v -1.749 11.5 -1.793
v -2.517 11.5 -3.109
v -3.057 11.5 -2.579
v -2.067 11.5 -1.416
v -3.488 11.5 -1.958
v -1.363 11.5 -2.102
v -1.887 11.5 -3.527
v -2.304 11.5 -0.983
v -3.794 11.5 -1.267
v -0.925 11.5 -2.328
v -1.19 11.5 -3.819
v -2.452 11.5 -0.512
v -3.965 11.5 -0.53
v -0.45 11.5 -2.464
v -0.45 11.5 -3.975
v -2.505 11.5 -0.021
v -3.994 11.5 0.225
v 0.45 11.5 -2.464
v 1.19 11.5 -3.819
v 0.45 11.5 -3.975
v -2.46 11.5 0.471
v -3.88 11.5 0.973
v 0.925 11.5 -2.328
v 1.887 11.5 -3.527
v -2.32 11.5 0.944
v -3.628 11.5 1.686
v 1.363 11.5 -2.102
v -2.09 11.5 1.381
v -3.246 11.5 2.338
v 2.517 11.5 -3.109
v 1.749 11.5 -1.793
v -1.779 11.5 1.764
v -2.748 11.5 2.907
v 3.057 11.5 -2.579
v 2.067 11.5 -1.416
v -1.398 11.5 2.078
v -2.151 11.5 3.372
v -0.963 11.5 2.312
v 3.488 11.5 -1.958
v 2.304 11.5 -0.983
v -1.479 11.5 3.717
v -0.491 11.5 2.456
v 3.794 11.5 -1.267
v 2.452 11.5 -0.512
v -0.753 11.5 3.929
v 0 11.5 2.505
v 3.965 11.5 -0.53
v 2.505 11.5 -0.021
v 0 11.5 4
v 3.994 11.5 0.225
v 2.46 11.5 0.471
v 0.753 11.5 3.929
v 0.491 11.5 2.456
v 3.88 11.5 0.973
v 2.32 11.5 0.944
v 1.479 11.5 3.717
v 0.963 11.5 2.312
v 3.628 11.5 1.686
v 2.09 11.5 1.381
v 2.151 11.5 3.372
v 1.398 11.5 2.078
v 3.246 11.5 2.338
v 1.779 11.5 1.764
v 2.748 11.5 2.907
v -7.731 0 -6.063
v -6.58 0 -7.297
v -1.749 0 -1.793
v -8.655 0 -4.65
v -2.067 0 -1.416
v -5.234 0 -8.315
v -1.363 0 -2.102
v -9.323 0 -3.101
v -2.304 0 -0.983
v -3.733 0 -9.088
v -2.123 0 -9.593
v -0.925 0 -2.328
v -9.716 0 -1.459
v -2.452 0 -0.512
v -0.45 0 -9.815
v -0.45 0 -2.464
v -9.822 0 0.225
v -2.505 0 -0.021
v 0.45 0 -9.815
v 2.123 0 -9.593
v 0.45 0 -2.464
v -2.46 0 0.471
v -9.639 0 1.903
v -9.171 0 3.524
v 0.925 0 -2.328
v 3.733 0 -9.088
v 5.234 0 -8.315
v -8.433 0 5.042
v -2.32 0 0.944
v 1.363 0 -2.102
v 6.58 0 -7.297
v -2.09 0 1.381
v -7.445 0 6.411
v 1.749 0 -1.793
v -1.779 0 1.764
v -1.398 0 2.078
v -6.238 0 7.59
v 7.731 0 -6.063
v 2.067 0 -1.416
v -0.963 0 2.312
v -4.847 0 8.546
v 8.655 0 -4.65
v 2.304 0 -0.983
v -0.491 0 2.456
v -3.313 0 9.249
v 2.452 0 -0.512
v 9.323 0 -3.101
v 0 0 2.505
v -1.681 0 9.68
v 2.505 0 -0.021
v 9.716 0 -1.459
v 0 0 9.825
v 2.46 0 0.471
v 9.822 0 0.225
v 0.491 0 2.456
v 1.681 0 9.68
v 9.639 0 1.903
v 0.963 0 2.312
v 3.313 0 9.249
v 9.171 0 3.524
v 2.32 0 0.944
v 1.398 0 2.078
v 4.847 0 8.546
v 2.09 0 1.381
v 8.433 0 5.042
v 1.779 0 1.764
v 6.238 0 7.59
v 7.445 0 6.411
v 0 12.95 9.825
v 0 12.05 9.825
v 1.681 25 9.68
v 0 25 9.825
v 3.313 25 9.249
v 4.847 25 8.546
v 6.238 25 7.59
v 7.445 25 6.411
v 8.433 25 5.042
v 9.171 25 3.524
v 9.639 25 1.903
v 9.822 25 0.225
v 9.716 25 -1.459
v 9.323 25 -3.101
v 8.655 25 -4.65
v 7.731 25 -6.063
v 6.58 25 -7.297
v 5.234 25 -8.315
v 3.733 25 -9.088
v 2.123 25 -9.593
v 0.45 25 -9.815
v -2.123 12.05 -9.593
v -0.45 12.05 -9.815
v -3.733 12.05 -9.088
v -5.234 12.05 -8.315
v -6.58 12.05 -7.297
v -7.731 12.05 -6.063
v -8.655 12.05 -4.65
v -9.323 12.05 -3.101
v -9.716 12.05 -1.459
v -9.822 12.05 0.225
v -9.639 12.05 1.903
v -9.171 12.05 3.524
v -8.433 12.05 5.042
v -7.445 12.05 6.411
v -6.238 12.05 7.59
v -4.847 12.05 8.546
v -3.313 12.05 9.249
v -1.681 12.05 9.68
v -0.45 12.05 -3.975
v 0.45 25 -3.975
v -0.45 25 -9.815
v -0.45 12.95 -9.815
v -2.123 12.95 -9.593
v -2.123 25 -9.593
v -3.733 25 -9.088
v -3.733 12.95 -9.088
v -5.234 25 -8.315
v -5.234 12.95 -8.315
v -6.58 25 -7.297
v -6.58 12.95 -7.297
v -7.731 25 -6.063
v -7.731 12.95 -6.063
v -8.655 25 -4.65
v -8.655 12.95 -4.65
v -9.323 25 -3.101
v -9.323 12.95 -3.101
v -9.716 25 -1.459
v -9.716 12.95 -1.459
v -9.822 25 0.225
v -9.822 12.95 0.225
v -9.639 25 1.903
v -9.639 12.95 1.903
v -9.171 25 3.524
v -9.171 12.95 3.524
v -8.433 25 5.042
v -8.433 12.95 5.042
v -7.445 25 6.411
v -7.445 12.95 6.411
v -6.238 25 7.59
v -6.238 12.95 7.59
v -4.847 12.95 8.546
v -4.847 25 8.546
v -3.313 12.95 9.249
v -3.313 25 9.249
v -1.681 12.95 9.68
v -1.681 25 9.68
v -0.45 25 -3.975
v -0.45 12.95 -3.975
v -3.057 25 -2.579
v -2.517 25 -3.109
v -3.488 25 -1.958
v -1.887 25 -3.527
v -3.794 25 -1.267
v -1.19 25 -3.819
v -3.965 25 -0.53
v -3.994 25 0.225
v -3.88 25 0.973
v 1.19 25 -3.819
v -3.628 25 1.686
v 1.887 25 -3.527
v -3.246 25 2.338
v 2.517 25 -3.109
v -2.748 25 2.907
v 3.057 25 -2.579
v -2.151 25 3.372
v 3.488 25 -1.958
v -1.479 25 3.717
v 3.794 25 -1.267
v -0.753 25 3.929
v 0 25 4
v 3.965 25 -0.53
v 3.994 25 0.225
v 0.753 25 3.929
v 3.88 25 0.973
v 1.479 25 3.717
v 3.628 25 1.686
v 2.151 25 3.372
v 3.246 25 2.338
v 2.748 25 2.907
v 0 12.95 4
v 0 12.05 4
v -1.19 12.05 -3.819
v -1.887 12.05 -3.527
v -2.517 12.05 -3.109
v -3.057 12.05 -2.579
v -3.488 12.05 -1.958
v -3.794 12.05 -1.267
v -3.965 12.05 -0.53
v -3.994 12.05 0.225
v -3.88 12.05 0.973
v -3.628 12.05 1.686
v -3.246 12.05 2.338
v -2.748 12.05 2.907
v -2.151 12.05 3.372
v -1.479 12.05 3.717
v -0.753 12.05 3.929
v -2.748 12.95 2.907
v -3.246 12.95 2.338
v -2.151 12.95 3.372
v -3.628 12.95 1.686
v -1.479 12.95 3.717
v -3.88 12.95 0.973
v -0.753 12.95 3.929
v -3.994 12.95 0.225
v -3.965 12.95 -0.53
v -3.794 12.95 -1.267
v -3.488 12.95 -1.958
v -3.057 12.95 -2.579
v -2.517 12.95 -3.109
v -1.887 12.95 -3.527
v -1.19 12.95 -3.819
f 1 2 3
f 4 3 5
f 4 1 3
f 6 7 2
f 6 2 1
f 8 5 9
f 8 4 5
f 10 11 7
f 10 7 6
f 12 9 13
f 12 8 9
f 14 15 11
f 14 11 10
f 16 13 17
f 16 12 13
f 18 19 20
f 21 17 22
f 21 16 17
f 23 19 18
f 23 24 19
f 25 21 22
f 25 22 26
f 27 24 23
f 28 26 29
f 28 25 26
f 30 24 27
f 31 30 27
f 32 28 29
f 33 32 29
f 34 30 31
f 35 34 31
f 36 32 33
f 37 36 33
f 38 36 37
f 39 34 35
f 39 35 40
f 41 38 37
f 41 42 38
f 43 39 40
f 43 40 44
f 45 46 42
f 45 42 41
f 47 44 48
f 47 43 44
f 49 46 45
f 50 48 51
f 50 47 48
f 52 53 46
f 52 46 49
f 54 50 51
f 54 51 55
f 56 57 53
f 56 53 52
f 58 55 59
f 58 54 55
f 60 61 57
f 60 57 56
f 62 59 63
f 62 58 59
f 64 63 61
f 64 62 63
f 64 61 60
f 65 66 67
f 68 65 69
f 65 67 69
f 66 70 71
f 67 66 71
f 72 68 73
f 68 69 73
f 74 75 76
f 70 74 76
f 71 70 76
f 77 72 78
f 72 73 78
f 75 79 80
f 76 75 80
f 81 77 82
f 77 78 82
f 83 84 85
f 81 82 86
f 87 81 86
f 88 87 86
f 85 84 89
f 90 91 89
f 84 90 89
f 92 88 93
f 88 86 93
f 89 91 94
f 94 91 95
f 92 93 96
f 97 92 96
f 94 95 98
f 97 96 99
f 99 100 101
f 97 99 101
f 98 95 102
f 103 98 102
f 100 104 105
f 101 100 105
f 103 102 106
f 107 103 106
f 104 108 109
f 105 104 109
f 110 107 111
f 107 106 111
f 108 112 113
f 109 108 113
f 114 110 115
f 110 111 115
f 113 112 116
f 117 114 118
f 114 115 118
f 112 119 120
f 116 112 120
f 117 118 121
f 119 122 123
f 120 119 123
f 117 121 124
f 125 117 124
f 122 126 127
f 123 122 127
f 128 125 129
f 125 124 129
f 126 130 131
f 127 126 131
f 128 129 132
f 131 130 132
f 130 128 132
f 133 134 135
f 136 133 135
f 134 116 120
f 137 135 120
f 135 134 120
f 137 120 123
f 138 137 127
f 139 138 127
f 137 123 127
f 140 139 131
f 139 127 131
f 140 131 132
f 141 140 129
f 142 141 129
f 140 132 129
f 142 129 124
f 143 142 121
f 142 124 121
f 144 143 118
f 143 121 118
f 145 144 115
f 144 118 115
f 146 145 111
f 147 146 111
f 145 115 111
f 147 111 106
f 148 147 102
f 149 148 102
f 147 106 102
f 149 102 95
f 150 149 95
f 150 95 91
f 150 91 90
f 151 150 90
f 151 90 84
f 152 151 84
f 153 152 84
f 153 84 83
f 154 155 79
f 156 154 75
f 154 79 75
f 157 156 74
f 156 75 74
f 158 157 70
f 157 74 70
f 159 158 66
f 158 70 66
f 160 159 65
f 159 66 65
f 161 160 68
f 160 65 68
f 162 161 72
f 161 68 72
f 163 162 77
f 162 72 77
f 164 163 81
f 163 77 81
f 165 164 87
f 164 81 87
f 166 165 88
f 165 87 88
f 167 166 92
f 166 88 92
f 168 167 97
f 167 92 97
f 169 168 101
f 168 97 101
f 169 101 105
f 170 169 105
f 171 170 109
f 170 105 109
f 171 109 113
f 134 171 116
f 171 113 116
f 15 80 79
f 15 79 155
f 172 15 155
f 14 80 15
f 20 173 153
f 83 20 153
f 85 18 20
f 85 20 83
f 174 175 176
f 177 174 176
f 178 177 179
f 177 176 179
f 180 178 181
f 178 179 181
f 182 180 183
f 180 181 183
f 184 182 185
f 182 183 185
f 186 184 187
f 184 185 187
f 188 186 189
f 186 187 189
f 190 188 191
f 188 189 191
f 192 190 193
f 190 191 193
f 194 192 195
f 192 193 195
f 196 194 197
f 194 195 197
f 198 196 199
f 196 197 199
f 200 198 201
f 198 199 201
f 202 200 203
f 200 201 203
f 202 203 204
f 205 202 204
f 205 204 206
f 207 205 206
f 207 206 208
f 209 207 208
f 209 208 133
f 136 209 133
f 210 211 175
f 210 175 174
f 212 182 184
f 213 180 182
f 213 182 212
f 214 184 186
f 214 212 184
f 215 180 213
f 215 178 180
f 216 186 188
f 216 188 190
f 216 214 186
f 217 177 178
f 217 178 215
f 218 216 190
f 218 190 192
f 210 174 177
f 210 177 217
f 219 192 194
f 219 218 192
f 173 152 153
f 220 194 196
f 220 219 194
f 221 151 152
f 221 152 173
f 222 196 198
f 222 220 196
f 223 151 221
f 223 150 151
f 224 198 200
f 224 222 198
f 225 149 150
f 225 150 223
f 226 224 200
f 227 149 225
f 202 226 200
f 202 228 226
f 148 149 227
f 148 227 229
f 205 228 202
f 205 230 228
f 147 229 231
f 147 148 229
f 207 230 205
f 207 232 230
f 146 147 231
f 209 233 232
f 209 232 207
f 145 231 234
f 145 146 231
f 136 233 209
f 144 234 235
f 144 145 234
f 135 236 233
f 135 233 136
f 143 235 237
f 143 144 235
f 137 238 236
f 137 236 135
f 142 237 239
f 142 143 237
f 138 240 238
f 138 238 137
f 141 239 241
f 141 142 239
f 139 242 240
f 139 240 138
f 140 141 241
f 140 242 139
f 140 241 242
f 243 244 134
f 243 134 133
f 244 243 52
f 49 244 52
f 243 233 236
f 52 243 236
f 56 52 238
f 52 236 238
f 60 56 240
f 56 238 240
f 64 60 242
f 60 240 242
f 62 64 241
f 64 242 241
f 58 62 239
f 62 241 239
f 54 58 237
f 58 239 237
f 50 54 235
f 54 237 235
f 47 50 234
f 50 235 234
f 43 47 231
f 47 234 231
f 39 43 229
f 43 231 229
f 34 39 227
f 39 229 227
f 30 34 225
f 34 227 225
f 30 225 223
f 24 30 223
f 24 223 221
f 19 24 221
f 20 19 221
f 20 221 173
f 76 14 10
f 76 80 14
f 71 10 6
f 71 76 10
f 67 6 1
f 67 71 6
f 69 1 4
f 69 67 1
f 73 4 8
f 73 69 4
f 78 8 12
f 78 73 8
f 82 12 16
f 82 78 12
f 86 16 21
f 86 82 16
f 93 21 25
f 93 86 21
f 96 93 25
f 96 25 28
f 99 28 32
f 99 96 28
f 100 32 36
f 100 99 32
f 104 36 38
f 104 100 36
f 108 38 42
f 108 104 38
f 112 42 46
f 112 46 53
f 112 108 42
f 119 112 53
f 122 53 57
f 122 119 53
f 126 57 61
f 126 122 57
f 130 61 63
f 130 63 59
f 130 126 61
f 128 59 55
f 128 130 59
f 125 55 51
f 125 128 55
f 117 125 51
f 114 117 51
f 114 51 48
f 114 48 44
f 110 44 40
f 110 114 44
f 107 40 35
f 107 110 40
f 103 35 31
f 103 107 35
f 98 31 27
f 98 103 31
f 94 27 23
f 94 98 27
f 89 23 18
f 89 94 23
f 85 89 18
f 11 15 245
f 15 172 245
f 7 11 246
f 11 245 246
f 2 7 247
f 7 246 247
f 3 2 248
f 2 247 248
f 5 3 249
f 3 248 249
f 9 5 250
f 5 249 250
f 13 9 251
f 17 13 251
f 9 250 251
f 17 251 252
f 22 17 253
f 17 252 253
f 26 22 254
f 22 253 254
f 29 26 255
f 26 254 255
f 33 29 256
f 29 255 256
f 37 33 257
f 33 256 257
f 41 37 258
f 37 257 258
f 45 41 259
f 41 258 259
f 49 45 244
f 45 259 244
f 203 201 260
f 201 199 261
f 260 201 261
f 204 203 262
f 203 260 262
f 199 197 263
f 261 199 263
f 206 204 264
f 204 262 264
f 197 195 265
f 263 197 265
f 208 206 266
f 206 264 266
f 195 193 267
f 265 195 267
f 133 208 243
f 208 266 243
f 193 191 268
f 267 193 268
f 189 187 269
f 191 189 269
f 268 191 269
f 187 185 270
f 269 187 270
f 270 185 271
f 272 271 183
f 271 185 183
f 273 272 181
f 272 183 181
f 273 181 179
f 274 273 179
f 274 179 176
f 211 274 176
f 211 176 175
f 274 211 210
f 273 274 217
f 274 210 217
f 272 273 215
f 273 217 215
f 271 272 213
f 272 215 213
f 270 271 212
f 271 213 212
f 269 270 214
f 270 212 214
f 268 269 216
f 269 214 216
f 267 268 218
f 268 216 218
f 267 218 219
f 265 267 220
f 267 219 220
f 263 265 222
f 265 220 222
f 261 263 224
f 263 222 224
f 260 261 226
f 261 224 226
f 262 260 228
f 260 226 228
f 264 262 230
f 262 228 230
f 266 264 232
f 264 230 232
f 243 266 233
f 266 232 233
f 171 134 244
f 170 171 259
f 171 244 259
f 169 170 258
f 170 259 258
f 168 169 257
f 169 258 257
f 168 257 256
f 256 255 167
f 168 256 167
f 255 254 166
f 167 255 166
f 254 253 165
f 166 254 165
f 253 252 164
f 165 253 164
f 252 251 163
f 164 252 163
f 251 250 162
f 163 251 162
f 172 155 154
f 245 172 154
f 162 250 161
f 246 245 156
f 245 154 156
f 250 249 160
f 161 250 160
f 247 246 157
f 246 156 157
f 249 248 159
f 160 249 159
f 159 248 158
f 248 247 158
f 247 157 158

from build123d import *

# Parameters (mm, degrees)
SKETCH1_R               = 9.825
SKETCH1_R_2             = 2.505
BOSS_EXTRUDE1_DEPTH     = 25
SKETCH2_R               = 4
CUT_EXTRUDE1_DEPTH      = 13.5
CUT_EXTRUDE2_DEPTH      = 13.5
CUT_EXTRUDE2_DEPTH_BACK = 13.5
CUT_EXTRUDE3_DEPTH      = 13.5


with BuildPart() as part:
    # Sketch1 → Boss-Extrude1 (new body)
    with BuildSketch(Plane(origin=(0, 0, 0), x_dir=(1, 0, 0), z_dir=(0, 1, 0))):
        Circle(SKETCH1_R)
        Circle(SKETCH1_R_2, mode=Mode.SUBTRACT)
    extrude(amount=BOSS_EXTRUDE1_DEPTH)

    # Sketch2 → Cut-Extrude1 (cut)
    with BuildSketch(Plane(origin=(0, 25, 0), x_dir=(1, 0, 0), z_dir=(0, 1, 0))):
        Circle(SKETCH2_R)
    extrude(amount=-CUT_EXTRUDE1_DEPTH, mode=Mode.SUBTRACT)

    # Sketch3 → Cut-Extrude2 (cut, two sides: drawn at the far end of the back side and taken through both)
    with BuildSketch(Plane.XY.offset(-CUT_EXTRUDE2_DEPTH_BACK)):
        Polygon((-9.825, 12.5), (-9.825, 12.95), (0, 12.95), (0, 12.5), (0, 12.05), (-9.825, 12.05), align=None)
    extrude(amount=CUT_EXTRUDE2_DEPTH + CUT_EXTRUDE2_DEPTH_BACK, mode=Mode.SUBTRACT)

    # Sketch5 → Cut-Extrude3 (cut)
    with BuildSketch(Plane.XY):
        Polygon((0, 0), (-0.45, 0), (-0.45, 25), (0, 25), (0.45, 25), (0.45, 0), align=None)
    extrude(amount=-CUT_EXTRUDE3_DEPTH, mode=Mode.SUBTRACT)


solid = part.part
